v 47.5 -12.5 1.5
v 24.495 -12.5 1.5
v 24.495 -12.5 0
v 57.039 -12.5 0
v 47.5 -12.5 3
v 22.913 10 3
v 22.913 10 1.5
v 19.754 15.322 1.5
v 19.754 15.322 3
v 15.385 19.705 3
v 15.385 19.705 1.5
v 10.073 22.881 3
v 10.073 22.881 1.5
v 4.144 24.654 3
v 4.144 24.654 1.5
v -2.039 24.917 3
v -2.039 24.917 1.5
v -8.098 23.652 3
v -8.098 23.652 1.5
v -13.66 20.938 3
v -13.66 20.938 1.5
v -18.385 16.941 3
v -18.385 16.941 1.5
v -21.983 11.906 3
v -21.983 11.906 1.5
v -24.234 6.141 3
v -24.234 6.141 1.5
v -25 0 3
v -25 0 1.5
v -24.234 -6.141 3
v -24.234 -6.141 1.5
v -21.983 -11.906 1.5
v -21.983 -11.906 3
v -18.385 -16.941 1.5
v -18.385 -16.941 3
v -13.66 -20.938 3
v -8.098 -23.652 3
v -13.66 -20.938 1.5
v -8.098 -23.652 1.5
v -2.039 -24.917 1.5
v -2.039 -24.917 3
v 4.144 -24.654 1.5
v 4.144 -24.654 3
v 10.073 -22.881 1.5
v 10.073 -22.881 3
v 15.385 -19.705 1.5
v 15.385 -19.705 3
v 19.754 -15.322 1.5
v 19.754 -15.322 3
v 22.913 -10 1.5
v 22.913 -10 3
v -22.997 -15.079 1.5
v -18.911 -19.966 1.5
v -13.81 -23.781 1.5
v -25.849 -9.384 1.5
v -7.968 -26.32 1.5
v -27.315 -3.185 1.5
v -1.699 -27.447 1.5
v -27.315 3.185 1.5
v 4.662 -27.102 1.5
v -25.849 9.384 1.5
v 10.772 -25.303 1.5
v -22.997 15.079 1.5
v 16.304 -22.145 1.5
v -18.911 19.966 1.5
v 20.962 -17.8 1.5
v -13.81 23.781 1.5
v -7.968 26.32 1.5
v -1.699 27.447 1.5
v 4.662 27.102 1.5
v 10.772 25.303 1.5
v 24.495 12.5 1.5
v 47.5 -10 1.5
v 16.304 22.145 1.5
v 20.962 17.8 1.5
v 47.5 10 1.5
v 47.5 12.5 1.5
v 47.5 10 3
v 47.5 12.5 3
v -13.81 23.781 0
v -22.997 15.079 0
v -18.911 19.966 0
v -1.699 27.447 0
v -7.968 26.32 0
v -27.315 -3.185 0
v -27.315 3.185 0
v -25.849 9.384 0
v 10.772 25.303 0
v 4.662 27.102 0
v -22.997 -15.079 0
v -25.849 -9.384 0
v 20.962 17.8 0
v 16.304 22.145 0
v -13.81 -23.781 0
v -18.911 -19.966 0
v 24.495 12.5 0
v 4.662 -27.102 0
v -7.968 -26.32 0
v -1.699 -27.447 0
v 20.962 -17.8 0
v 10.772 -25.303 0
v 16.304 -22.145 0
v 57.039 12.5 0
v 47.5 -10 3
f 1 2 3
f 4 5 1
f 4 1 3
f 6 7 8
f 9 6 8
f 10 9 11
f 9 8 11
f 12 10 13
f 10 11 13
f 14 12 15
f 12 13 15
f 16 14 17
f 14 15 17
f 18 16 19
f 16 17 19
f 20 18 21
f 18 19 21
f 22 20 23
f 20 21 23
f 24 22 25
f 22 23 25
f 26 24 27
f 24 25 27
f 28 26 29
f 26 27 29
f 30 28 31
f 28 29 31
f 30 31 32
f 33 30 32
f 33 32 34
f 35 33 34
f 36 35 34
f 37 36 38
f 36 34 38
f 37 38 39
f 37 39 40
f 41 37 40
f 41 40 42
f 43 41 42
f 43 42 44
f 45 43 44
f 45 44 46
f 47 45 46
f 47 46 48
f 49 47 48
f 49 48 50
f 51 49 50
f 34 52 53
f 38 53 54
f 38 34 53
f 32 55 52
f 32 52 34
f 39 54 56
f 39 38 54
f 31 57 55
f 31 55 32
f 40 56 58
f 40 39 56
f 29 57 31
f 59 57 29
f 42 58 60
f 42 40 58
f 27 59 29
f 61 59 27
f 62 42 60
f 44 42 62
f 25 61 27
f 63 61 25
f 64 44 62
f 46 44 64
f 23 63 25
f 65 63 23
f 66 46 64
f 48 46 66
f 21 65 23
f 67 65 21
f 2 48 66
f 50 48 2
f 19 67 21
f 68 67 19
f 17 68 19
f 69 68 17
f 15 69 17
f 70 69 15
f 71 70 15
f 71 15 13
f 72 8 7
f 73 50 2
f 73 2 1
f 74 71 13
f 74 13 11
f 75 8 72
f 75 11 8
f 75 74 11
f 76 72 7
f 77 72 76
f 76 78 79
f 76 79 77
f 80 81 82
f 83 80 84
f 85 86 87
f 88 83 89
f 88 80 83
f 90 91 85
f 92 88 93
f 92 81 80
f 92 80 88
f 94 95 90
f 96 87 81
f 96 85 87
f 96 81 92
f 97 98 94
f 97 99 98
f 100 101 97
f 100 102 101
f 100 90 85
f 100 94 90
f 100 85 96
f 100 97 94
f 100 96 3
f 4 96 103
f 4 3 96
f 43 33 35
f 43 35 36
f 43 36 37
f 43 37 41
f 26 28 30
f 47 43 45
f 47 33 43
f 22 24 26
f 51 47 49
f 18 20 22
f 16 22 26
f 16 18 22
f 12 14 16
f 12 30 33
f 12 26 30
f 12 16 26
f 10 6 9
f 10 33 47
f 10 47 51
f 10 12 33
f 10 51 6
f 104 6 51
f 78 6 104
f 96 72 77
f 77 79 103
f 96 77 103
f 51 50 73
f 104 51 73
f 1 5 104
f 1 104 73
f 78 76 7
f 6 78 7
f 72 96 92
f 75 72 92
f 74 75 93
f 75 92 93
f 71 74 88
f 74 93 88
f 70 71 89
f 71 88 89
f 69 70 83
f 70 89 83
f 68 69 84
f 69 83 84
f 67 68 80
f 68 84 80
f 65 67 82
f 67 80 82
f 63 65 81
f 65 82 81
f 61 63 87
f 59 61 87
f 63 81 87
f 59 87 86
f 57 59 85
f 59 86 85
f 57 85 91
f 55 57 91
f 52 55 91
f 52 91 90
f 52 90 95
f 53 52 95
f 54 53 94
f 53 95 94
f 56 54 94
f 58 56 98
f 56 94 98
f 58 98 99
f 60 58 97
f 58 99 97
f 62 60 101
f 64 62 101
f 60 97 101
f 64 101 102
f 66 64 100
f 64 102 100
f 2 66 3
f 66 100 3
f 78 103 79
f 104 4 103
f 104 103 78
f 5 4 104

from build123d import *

# Parameters (mm, degrees)
F1_DEPTH = 1.5
F0_W     = 20
F0_H     = 20
F2_DEPTH = 3
F4_DEPTH = 12.5


with BuildPart() as f1:
    # F0 (on Top) → F1 (new body)
    with BuildSketch(Plane.XY):
        with BuildLine():
            Line((22.912878, 10), (27.5, 10))
            Line((27.5, 10), (47.5, 10))
            Line((47.5, 10), (47.5, 12.5))
            Line((47.5, 12.5), (27.5, 12.5))
            Line((27.5, 12.5), (24.494897, 12.5))
            ThreePointArc((24.494897, 12.5), (-27.5, 0), (24.494897, -12.5))
            Line((24.494897, -12.5), (27.5, -12.5))
            Line((27.5, -12.5), (47.5, -12.5))
            Line((47.5, -12.5), (47.5, -10))
            Line((47.5, -10), (27.5, -10))
            Line((27.5, -10), (22.912878, -10))
            ThreePointArc((22.912878, -10), (-25, 0), (22.912878, 10))
        make_face()
    extrude(amount=F1_DEPTH)

    # F0 (on Top) → F2 (join)
    with BuildSketch(Plane.XY):
        with BuildLine():
            Line((27.5, -10), (27.5, 10))
            Line((27.5, 10), (22.912878, 10))
            ThreePointArc((22.912878, 10), (-25, 0), (22.912878, -10))
            Line((22.912878, -10), (27.5, -10))
        make_face()
        with Locations((37.5, 0)):
            Rectangle(F0_W, F0_H)
    extrude(amount=F2_DEPTH)

    # F3 (on Front) → F4 (join, symmetric)
    with BuildSketch(Plane.XZ):
        Polygon((47.5, 3), (47.5, 0), (57.039392, 0), align=None)
    extrude(amount=F4_DEPTH, both=True)


solid = f1.part
